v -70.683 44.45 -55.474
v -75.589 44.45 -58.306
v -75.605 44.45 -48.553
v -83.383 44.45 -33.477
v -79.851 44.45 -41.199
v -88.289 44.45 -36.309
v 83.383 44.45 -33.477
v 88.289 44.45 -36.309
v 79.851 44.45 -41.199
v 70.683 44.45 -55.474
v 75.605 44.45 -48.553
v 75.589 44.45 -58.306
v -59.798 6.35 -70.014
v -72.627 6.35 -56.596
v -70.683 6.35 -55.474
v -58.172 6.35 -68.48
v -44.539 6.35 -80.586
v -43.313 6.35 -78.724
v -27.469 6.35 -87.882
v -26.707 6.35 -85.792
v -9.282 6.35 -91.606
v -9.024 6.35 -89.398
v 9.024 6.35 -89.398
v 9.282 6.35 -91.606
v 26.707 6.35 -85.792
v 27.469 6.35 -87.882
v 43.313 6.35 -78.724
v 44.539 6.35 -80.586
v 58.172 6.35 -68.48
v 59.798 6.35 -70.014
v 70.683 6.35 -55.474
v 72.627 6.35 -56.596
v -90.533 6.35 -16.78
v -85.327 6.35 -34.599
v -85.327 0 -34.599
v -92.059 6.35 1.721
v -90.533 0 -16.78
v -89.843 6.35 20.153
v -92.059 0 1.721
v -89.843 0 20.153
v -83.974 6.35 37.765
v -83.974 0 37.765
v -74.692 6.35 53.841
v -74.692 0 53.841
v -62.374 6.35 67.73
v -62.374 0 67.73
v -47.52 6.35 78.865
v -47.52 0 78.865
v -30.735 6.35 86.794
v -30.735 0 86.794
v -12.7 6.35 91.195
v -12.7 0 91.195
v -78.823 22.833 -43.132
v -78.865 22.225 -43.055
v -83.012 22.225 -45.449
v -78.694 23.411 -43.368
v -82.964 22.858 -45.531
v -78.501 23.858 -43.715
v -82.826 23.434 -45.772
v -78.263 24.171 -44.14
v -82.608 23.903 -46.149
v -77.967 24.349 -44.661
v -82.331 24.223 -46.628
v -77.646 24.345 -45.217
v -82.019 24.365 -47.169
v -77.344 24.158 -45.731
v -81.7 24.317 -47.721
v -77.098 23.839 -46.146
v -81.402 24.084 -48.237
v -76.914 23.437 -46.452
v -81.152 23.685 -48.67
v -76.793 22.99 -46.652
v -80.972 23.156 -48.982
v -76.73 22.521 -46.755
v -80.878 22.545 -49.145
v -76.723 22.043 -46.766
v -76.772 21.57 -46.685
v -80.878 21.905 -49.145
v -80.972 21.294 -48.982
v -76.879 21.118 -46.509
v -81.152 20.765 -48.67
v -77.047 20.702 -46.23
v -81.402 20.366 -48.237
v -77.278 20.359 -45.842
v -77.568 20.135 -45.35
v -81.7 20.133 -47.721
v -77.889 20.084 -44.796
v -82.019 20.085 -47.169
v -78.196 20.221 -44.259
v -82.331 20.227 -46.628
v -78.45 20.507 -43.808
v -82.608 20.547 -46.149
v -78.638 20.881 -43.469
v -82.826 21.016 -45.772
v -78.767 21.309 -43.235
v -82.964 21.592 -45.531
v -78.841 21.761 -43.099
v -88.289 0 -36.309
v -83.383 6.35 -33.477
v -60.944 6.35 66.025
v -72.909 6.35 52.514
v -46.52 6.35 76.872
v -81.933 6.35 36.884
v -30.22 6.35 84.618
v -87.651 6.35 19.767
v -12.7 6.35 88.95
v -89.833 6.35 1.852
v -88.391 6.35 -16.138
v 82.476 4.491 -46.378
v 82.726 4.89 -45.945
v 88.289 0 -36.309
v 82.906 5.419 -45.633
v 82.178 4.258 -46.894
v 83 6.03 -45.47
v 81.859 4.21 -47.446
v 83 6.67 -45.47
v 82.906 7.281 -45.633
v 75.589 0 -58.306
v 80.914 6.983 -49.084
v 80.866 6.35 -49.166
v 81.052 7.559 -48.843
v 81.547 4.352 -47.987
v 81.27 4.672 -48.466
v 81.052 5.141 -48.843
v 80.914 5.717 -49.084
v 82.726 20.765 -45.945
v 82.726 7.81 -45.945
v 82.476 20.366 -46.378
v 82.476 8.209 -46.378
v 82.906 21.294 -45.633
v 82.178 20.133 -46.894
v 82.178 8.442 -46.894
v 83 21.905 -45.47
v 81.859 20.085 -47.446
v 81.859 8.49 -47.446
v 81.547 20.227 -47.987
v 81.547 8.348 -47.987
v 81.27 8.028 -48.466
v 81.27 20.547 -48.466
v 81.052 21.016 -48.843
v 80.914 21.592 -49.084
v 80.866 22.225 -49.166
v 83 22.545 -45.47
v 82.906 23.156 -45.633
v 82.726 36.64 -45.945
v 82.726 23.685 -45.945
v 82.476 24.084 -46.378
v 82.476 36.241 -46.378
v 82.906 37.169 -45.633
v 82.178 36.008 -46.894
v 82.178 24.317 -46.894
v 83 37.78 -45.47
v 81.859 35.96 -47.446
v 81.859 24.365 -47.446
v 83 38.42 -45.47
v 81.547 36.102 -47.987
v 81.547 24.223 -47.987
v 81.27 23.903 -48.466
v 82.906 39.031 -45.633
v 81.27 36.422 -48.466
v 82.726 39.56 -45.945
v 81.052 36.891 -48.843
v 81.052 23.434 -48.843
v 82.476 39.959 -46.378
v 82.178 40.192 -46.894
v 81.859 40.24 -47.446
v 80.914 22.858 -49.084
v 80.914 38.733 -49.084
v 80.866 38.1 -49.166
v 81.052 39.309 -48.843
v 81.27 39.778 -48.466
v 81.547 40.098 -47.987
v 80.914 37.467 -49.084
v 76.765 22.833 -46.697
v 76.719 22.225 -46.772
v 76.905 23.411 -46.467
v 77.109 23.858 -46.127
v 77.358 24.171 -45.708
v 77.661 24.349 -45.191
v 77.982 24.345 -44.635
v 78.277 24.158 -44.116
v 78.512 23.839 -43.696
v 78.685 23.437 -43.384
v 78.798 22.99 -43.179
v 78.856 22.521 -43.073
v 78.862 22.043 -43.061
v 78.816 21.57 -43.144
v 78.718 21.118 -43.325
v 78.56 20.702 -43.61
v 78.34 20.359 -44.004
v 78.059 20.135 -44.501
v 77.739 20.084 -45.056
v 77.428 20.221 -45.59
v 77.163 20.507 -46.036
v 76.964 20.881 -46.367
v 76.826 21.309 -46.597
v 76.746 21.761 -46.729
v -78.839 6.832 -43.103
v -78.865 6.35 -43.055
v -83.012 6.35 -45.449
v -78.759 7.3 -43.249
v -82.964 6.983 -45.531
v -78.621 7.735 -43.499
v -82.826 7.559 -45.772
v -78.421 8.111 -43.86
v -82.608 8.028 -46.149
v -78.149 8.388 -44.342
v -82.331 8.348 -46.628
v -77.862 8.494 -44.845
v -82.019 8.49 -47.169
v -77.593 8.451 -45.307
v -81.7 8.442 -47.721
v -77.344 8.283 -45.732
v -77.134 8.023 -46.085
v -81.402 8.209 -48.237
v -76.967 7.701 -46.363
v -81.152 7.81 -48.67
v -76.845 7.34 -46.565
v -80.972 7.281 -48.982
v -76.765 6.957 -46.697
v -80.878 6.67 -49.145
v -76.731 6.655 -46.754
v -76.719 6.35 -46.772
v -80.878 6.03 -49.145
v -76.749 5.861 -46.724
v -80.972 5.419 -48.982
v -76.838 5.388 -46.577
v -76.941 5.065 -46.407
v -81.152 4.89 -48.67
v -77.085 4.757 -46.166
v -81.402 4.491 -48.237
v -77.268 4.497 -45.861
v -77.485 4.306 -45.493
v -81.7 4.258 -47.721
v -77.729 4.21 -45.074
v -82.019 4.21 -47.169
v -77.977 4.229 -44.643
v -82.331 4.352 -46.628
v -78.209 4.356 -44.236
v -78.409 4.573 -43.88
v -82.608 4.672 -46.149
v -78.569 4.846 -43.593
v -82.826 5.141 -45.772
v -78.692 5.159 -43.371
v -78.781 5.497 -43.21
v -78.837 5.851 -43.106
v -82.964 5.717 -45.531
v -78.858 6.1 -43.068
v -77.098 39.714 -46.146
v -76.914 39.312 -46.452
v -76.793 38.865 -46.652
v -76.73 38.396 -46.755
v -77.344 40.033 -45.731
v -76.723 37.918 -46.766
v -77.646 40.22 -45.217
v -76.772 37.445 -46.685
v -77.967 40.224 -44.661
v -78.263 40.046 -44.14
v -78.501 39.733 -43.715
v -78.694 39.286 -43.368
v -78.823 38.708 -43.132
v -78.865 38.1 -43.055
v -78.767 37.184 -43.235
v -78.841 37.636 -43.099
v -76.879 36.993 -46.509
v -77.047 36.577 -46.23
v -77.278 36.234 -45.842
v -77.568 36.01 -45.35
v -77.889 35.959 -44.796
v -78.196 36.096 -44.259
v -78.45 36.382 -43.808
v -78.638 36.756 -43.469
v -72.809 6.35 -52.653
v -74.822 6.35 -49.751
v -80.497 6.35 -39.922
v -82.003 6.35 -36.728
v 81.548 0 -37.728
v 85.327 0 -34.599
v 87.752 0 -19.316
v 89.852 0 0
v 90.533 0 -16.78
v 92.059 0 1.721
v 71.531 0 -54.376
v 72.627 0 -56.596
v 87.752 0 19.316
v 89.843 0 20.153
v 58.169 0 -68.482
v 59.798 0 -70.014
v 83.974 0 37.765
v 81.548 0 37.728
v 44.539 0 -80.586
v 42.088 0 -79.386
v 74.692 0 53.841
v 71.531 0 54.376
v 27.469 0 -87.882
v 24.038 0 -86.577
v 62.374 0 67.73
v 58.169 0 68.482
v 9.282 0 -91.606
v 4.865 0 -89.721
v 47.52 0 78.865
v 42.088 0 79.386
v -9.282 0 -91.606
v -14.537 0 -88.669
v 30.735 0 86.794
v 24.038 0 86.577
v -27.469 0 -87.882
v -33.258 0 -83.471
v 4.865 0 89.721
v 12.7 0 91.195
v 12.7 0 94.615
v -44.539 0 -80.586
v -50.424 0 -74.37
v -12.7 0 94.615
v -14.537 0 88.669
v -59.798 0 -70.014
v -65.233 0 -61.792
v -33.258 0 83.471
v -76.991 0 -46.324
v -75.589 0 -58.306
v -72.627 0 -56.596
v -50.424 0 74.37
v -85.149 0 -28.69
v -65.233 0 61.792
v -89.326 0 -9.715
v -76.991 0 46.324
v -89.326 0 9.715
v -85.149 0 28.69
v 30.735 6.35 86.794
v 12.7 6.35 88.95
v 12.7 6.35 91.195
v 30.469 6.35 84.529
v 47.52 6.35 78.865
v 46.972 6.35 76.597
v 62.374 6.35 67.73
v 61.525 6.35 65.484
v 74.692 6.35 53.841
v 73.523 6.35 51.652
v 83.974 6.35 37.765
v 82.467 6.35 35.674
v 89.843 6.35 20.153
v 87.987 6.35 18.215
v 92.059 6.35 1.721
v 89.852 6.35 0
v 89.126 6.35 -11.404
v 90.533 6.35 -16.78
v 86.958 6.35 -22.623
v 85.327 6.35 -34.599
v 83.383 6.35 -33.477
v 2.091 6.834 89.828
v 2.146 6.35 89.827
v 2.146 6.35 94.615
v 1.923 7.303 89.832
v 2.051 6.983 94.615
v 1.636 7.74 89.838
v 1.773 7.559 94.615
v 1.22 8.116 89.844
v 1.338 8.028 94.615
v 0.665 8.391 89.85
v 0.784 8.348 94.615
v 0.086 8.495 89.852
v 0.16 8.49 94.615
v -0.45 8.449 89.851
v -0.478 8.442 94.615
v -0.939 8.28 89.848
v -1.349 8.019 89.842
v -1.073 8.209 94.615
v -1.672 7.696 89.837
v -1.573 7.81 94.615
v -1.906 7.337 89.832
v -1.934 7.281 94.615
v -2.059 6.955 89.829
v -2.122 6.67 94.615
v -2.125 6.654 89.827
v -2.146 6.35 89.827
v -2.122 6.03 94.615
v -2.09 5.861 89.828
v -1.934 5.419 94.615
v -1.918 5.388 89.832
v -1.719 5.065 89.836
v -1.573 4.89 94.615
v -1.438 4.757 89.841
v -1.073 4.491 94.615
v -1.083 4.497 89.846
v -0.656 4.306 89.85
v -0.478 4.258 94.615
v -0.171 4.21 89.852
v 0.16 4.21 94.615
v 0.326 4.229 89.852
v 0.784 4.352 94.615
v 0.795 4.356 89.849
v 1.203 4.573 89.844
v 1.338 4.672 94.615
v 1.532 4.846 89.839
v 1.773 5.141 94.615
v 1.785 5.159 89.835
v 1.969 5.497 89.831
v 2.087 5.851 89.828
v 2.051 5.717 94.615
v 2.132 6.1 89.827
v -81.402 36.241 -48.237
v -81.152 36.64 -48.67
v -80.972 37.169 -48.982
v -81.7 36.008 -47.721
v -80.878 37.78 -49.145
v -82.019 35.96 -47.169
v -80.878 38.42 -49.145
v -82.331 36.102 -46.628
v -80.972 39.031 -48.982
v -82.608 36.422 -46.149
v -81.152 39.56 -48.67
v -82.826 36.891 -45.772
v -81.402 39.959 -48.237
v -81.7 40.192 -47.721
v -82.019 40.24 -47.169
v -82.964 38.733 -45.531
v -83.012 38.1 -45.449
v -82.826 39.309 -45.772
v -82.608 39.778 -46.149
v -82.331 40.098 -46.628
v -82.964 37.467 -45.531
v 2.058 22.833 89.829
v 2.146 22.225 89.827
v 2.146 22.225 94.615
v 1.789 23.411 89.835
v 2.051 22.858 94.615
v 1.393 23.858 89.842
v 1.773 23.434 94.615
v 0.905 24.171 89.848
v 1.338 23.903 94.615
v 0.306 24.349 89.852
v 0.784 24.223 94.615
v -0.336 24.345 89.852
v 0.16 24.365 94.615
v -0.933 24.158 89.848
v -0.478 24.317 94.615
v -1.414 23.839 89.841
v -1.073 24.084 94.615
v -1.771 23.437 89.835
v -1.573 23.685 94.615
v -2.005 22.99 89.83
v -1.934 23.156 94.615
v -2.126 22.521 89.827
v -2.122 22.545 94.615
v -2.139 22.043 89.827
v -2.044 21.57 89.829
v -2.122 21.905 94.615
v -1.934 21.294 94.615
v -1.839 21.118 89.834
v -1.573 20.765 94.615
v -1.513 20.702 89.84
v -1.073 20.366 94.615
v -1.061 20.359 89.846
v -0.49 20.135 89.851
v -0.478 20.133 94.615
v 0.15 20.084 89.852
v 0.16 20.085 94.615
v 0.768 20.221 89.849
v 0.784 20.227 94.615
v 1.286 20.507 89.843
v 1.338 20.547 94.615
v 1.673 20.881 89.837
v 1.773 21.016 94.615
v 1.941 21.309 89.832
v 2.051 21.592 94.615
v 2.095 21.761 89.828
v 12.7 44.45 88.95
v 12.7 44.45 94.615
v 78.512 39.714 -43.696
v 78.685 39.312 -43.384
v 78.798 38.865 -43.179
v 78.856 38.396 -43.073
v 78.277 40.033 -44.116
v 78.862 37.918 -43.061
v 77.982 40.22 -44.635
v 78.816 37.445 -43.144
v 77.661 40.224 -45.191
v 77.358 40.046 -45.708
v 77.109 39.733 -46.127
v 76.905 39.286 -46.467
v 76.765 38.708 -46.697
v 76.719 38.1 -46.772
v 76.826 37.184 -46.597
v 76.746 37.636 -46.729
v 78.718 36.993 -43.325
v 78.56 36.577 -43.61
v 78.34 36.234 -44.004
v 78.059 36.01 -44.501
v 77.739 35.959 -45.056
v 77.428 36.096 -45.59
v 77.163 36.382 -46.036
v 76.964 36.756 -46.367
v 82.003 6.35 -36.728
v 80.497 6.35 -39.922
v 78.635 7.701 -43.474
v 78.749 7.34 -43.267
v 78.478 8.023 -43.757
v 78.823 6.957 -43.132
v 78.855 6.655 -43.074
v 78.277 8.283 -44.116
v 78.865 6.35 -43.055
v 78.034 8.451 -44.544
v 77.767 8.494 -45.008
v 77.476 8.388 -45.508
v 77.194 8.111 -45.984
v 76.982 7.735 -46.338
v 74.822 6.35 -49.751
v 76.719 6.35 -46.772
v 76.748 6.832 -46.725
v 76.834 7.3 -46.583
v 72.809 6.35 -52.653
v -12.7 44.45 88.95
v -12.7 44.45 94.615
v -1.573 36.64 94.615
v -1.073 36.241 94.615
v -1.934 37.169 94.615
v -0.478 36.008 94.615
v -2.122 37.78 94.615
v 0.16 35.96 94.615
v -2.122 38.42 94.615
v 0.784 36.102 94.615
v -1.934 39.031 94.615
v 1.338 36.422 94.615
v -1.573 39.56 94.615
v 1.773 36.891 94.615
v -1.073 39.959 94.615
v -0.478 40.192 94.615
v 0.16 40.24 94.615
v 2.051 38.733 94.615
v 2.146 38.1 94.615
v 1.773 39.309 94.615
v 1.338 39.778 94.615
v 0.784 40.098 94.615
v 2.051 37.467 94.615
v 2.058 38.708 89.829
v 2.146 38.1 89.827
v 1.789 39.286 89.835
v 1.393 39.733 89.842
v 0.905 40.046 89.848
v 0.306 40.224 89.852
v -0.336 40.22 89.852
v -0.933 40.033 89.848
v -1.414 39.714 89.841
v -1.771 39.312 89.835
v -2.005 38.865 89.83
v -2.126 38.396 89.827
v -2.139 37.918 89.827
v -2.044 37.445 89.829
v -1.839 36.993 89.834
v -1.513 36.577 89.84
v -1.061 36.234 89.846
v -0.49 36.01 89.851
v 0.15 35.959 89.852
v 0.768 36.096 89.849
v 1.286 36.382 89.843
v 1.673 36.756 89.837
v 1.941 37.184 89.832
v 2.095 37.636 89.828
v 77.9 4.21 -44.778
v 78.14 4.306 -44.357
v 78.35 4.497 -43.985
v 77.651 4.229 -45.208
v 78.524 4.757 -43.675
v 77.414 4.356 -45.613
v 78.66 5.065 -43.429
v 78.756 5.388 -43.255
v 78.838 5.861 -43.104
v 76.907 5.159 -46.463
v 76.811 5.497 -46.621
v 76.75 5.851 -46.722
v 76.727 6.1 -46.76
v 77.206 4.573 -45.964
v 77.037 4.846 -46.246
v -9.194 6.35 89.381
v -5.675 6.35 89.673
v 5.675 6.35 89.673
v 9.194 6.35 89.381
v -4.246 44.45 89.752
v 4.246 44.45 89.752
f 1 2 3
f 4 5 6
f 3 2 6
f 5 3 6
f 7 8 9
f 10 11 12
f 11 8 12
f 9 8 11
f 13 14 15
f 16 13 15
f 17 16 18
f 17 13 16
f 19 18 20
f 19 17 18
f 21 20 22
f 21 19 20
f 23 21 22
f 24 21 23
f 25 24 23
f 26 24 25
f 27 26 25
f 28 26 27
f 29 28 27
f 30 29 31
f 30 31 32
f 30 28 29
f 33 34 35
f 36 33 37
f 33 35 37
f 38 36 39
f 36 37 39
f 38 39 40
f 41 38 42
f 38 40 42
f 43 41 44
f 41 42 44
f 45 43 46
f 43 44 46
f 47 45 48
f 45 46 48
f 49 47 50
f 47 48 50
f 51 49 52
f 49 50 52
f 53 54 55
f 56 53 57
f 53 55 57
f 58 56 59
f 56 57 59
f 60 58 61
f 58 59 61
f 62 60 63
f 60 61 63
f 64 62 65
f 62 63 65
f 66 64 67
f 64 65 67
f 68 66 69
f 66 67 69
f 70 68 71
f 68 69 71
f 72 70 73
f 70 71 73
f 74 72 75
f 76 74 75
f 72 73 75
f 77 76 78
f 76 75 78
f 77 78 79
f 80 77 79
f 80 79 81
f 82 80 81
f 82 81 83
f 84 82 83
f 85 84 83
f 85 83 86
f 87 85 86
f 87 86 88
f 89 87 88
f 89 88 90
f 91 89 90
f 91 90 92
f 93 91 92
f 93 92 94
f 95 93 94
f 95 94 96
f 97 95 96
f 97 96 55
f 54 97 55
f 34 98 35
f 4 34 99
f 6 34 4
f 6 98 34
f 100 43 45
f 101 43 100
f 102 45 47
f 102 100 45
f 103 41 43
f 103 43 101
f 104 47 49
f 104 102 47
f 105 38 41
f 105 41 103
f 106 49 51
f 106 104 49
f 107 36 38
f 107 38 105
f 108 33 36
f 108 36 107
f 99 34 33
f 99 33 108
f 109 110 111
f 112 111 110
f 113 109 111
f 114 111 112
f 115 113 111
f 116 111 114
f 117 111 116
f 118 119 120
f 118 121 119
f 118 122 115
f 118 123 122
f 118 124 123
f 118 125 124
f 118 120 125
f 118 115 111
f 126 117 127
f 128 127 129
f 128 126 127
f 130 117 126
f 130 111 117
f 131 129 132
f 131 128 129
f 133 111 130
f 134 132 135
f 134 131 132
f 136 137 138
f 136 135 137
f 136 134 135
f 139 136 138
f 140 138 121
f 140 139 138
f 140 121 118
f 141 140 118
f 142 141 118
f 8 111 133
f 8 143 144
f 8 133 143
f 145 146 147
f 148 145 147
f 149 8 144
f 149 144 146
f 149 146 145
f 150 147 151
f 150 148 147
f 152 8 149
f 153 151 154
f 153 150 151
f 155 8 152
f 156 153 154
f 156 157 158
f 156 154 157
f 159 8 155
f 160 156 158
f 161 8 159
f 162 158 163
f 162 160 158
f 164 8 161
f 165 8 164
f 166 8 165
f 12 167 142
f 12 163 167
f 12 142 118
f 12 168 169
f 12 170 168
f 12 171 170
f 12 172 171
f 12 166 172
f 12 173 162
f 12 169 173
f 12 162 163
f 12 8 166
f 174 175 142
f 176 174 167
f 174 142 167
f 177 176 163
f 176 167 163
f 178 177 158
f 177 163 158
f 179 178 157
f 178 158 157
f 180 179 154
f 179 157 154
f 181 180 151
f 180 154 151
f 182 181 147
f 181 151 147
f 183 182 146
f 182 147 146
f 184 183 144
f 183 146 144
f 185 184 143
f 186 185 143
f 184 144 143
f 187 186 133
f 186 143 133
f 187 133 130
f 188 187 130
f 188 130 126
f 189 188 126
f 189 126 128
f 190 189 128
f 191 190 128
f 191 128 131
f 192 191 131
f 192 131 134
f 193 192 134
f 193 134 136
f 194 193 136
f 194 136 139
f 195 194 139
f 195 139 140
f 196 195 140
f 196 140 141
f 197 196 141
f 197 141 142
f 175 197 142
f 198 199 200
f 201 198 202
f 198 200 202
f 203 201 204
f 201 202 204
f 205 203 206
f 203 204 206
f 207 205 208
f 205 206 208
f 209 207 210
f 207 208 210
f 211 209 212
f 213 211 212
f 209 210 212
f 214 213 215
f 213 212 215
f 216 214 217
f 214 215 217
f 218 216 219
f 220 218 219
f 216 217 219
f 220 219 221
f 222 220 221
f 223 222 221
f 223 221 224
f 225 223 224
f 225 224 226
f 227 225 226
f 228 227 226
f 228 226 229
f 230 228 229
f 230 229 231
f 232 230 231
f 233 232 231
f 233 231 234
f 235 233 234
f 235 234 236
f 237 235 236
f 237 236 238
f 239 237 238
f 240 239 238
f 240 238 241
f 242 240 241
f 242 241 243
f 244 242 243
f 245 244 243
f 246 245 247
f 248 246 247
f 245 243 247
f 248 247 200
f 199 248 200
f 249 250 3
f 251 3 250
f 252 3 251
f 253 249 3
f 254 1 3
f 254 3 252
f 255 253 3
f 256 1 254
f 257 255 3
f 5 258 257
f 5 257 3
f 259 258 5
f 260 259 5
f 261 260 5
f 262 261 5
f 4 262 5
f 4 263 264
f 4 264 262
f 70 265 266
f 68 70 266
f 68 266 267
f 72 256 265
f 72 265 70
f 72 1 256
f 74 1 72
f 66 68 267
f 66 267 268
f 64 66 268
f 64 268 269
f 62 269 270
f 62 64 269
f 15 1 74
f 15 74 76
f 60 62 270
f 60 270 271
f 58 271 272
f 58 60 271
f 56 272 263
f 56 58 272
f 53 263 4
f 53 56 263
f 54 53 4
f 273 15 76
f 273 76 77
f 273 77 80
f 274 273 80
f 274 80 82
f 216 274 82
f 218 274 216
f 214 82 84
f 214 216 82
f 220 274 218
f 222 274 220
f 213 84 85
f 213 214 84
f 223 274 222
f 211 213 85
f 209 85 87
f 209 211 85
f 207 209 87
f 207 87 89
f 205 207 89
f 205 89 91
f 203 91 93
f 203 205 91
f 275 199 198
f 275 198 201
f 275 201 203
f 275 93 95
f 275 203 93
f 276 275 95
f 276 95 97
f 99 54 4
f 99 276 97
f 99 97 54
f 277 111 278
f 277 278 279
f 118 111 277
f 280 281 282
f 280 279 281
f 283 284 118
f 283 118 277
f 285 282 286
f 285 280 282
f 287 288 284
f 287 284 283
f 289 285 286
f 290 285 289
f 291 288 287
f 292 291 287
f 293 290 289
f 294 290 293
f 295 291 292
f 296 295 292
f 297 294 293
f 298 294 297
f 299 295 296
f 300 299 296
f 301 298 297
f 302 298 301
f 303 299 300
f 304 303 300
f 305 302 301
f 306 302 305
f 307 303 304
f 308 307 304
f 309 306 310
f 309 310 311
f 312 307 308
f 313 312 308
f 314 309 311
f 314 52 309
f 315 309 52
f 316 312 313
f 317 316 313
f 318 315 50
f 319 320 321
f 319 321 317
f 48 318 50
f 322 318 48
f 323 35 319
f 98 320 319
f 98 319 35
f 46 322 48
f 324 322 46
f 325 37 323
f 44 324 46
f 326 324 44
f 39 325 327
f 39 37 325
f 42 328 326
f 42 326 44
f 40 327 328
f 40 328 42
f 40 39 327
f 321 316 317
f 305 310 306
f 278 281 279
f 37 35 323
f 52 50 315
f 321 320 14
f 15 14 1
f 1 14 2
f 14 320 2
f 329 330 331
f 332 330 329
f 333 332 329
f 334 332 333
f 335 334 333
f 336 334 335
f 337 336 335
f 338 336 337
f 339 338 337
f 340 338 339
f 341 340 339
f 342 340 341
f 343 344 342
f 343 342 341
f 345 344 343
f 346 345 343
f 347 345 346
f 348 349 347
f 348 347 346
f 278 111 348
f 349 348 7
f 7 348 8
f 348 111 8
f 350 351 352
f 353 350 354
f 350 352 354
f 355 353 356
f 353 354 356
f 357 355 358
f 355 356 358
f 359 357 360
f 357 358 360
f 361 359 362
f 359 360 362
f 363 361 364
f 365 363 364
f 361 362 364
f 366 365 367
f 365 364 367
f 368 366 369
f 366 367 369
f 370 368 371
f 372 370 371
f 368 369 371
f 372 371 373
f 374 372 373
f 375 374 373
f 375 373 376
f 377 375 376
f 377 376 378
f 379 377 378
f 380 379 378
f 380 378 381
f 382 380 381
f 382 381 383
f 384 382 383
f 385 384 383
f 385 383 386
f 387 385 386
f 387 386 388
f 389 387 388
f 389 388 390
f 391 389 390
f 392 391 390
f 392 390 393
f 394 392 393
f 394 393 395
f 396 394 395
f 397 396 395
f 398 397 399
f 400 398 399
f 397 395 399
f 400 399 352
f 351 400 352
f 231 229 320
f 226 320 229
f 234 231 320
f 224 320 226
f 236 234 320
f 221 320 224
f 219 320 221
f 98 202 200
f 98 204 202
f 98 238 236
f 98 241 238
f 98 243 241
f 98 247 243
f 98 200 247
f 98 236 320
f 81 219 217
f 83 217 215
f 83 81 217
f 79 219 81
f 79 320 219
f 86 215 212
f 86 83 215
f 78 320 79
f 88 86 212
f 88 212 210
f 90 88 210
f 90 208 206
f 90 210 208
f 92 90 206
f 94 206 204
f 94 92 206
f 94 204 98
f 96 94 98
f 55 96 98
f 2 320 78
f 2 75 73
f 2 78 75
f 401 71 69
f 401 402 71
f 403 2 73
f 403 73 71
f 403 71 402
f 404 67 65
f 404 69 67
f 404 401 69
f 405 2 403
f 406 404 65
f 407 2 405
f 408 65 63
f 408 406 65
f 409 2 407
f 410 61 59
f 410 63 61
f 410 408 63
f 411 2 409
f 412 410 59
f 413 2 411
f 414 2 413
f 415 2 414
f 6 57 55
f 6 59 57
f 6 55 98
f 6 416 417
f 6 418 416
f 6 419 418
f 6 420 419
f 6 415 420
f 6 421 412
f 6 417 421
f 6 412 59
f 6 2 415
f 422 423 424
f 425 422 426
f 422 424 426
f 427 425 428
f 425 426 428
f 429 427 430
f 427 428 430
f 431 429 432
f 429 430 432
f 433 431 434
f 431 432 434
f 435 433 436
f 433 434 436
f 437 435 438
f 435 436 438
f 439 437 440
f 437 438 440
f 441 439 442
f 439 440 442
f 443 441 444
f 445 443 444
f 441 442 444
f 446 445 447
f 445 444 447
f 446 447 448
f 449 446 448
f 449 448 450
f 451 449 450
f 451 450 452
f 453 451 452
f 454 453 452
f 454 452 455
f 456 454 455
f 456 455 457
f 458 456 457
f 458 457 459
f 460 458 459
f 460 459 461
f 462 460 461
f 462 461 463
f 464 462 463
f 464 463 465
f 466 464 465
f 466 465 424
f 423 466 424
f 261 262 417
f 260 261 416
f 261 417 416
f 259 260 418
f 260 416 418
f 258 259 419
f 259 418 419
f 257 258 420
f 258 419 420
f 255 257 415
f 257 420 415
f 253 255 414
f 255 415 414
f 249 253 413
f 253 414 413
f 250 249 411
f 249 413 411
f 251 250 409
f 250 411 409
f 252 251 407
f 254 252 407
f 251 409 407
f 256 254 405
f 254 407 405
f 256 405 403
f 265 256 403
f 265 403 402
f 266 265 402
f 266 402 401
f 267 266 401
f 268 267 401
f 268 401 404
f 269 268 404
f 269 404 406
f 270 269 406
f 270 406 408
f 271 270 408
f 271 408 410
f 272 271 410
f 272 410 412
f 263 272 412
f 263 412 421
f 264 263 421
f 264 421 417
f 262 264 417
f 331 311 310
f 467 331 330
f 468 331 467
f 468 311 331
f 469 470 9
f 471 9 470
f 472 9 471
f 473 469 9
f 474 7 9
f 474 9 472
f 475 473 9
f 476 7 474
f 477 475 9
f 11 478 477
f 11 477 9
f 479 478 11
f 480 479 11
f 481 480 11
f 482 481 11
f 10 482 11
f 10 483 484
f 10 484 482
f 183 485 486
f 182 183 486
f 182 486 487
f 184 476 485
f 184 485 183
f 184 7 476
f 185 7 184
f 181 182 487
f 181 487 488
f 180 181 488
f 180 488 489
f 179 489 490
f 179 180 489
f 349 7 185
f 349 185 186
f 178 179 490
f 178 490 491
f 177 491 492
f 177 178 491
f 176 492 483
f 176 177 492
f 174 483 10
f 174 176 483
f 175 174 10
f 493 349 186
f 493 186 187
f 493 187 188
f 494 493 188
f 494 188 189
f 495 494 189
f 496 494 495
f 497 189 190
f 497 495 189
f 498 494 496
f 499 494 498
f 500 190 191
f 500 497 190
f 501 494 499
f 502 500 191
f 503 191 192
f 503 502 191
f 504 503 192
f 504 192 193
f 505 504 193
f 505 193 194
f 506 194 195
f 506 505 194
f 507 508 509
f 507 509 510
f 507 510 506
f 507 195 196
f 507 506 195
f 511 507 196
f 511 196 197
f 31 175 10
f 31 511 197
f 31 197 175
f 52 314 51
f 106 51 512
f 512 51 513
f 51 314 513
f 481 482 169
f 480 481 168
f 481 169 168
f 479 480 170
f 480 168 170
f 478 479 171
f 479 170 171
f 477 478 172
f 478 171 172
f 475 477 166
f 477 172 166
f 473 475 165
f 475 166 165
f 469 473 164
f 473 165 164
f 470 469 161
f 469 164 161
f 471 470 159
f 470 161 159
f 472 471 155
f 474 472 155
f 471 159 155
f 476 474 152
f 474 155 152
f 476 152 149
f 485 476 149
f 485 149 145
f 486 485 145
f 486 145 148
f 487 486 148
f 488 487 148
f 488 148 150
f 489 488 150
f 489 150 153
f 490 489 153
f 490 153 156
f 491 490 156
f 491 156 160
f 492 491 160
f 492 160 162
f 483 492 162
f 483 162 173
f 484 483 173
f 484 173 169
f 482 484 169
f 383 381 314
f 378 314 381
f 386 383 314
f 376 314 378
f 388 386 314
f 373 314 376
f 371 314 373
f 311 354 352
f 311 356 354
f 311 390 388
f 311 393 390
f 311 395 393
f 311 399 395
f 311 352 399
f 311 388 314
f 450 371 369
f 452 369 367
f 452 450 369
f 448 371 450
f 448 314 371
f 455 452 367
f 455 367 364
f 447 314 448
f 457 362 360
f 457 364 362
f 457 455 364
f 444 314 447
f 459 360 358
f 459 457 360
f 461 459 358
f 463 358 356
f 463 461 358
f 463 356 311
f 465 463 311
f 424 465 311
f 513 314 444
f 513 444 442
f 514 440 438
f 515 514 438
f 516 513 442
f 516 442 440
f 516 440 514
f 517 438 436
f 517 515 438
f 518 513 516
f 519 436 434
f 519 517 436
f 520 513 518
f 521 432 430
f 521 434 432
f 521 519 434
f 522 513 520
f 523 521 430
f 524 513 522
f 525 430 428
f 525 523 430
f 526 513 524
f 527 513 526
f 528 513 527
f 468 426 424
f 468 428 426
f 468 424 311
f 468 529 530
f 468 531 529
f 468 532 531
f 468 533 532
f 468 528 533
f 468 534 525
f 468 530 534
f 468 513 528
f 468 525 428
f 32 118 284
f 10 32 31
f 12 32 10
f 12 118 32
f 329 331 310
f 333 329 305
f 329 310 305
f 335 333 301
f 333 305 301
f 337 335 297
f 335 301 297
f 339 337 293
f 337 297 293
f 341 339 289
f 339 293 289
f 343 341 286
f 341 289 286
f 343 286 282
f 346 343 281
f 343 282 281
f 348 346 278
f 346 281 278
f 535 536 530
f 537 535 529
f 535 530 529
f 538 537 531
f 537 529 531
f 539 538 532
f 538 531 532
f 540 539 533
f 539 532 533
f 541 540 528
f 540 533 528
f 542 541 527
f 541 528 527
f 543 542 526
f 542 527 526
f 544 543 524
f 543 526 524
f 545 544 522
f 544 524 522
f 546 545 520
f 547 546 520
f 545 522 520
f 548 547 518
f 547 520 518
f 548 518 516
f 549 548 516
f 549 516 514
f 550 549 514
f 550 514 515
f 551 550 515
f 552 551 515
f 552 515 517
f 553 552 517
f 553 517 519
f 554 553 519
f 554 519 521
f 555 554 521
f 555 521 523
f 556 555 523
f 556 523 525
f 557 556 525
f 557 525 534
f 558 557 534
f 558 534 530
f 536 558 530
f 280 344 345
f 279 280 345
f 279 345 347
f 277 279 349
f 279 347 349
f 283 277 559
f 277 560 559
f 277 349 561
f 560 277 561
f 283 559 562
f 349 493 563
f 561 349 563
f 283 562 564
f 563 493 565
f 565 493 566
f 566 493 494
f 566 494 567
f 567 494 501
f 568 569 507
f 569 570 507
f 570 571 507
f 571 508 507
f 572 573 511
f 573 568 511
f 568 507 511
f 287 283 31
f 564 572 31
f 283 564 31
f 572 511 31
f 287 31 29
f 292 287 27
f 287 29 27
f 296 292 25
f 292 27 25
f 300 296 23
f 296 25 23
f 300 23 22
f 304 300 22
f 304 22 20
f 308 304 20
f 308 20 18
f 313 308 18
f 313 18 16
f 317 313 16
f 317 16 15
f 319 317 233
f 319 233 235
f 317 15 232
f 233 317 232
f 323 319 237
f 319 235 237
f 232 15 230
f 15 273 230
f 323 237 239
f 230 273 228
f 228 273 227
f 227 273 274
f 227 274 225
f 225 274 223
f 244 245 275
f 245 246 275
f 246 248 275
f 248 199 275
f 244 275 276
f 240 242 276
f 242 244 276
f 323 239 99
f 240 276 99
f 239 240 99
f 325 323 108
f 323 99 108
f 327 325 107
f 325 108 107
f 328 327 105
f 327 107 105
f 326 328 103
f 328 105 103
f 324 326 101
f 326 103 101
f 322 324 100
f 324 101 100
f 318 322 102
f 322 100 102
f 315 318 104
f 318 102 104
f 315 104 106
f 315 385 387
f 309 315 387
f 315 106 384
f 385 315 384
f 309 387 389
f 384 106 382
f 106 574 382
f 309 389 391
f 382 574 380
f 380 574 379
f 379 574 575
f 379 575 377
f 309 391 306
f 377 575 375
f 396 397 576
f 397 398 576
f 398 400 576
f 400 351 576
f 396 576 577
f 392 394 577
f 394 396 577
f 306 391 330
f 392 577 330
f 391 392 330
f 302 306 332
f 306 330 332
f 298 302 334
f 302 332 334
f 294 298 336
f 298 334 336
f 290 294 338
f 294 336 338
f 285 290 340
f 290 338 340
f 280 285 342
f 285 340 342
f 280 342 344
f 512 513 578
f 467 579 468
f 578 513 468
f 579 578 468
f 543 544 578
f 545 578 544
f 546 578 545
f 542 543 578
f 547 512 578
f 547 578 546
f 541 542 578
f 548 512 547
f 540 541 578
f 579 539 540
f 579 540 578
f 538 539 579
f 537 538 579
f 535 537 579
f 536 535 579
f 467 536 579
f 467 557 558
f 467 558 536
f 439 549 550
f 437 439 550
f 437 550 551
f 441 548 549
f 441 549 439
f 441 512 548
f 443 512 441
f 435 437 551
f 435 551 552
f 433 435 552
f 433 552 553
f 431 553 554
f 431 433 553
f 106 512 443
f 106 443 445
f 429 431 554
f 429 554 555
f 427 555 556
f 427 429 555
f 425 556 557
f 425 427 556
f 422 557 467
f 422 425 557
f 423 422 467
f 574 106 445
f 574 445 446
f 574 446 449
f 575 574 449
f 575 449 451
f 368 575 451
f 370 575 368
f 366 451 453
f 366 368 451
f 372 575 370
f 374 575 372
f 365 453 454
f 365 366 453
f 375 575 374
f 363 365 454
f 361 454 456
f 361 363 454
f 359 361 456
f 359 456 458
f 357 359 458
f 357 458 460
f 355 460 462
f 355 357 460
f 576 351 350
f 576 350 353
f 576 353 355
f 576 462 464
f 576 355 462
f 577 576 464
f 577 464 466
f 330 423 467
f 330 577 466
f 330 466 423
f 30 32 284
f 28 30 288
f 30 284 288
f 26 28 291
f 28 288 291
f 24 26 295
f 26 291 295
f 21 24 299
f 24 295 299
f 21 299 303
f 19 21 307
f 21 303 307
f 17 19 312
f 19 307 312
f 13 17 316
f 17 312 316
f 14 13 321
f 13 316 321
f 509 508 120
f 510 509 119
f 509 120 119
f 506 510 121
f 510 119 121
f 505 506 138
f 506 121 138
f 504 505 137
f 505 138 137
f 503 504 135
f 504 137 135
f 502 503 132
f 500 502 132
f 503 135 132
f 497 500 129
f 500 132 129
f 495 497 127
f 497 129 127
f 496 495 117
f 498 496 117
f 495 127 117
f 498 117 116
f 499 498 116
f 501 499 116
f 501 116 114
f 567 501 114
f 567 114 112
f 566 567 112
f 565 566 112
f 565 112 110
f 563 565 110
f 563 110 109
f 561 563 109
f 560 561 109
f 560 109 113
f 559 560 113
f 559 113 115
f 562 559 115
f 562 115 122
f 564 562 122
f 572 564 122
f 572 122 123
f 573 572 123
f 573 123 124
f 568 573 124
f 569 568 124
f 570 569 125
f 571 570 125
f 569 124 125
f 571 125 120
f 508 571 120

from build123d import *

# Parameters (mm, degrees)
SKETCH1_R               = 92.075
BOSS_EXTRUDE1_DEPTH     = 6.35
BOSS_EXTRUDE4_START     = 94.615
SKETCH2_W               = 25.4
SKETCH2_H               = 44.45
BOSS_EXTRUDE4_DEPTH     = 6.35
SKETCH4_R               = 2.1463
CUT_EXTRUDE2_DEPTH      = 6.35
CIRPATTERN1_COUNT       = 3
SKETCH3_R               = 89.8525
CUT_EXTRUDE1_DEPTH      = 50.8
CUT_EXTRUDE1_DEPTH_BACK = 6.35


with BuildPart() as part:
    # Sketch1 → Boss-Extrude1 (new body)
    with BuildSketch(Plane(origin=(0, 0, 0), x_dir=(1, 0, 0), z_dir=(0, 1, 0))):
        Circle(SKETCH1_R)
    extrude(amount=BOSS_EXTRUDE1_DEPTH)

    # Sketch2 → Boss-Extrude4 (add)
    with BuildSketch(Plane.XY.offset(BOSS_EXTRUDE4_START)):
        with Locations((0, 22.225)):
            Rectangle(SKETCH2_W, SKETCH2_H)
    boss_extrude4 = extrude(amount=-BOSS_EXTRUDE4_DEPTH)

    # Sketch4 → Cut-Extrude2 (cut)
    with BuildSketch(Plane.XY.offset(94.615)):
        with Locations((0, 38.1)):
            Circle(SKETCH4_R)
        with Locations((0, 22.225)):
            Circle(SKETCH4_R)
        with Locations((0, 6.35)):
            Circle(SKETCH4_R)
    cut_extrude2 = extrude(amount=-CUT_EXTRUDE2_DEPTH, mode=Mode.SUBTRACT)

    # CirPattern1: Boss-Extrude4, Cut-Extrude2 ×3 about axis
    cirpattern1_axis = Axis((0, 0, 0), (0, 1, 0))
    for i in range(1, CIRPATTERN1_COUNT):
        add(boss_extrude4.rotate(cirpattern1_axis, i * 360 / CIRPATTERN1_COUNT))
        add(cut_extrude2.rotate(cirpattern1_axis, i * 360 / CIRPATTERN1_COUNT), mode=Mode.SUBTRACT)

    # Sketch3 → Cut-Extrude1 (cut, two sides)
    with BuildSketch(Plane(origin=(0, 6.35, 0), x_dir=(1, 0, 0), z_dir=(0, 1, 0))) as cut_extrude1_sk:
        Circle(SKETCH3_R)
    extrude(amount=CUT_EXTRUDE1_DEPTH, mode=Mode.SUBTRACT)
    extrude(cut_extrude1_sk.sketch, amount=-CUT_EXTRUDE1_DEPTH_BACK, mode=Mode.SUBTRACT)


solid = part.part
